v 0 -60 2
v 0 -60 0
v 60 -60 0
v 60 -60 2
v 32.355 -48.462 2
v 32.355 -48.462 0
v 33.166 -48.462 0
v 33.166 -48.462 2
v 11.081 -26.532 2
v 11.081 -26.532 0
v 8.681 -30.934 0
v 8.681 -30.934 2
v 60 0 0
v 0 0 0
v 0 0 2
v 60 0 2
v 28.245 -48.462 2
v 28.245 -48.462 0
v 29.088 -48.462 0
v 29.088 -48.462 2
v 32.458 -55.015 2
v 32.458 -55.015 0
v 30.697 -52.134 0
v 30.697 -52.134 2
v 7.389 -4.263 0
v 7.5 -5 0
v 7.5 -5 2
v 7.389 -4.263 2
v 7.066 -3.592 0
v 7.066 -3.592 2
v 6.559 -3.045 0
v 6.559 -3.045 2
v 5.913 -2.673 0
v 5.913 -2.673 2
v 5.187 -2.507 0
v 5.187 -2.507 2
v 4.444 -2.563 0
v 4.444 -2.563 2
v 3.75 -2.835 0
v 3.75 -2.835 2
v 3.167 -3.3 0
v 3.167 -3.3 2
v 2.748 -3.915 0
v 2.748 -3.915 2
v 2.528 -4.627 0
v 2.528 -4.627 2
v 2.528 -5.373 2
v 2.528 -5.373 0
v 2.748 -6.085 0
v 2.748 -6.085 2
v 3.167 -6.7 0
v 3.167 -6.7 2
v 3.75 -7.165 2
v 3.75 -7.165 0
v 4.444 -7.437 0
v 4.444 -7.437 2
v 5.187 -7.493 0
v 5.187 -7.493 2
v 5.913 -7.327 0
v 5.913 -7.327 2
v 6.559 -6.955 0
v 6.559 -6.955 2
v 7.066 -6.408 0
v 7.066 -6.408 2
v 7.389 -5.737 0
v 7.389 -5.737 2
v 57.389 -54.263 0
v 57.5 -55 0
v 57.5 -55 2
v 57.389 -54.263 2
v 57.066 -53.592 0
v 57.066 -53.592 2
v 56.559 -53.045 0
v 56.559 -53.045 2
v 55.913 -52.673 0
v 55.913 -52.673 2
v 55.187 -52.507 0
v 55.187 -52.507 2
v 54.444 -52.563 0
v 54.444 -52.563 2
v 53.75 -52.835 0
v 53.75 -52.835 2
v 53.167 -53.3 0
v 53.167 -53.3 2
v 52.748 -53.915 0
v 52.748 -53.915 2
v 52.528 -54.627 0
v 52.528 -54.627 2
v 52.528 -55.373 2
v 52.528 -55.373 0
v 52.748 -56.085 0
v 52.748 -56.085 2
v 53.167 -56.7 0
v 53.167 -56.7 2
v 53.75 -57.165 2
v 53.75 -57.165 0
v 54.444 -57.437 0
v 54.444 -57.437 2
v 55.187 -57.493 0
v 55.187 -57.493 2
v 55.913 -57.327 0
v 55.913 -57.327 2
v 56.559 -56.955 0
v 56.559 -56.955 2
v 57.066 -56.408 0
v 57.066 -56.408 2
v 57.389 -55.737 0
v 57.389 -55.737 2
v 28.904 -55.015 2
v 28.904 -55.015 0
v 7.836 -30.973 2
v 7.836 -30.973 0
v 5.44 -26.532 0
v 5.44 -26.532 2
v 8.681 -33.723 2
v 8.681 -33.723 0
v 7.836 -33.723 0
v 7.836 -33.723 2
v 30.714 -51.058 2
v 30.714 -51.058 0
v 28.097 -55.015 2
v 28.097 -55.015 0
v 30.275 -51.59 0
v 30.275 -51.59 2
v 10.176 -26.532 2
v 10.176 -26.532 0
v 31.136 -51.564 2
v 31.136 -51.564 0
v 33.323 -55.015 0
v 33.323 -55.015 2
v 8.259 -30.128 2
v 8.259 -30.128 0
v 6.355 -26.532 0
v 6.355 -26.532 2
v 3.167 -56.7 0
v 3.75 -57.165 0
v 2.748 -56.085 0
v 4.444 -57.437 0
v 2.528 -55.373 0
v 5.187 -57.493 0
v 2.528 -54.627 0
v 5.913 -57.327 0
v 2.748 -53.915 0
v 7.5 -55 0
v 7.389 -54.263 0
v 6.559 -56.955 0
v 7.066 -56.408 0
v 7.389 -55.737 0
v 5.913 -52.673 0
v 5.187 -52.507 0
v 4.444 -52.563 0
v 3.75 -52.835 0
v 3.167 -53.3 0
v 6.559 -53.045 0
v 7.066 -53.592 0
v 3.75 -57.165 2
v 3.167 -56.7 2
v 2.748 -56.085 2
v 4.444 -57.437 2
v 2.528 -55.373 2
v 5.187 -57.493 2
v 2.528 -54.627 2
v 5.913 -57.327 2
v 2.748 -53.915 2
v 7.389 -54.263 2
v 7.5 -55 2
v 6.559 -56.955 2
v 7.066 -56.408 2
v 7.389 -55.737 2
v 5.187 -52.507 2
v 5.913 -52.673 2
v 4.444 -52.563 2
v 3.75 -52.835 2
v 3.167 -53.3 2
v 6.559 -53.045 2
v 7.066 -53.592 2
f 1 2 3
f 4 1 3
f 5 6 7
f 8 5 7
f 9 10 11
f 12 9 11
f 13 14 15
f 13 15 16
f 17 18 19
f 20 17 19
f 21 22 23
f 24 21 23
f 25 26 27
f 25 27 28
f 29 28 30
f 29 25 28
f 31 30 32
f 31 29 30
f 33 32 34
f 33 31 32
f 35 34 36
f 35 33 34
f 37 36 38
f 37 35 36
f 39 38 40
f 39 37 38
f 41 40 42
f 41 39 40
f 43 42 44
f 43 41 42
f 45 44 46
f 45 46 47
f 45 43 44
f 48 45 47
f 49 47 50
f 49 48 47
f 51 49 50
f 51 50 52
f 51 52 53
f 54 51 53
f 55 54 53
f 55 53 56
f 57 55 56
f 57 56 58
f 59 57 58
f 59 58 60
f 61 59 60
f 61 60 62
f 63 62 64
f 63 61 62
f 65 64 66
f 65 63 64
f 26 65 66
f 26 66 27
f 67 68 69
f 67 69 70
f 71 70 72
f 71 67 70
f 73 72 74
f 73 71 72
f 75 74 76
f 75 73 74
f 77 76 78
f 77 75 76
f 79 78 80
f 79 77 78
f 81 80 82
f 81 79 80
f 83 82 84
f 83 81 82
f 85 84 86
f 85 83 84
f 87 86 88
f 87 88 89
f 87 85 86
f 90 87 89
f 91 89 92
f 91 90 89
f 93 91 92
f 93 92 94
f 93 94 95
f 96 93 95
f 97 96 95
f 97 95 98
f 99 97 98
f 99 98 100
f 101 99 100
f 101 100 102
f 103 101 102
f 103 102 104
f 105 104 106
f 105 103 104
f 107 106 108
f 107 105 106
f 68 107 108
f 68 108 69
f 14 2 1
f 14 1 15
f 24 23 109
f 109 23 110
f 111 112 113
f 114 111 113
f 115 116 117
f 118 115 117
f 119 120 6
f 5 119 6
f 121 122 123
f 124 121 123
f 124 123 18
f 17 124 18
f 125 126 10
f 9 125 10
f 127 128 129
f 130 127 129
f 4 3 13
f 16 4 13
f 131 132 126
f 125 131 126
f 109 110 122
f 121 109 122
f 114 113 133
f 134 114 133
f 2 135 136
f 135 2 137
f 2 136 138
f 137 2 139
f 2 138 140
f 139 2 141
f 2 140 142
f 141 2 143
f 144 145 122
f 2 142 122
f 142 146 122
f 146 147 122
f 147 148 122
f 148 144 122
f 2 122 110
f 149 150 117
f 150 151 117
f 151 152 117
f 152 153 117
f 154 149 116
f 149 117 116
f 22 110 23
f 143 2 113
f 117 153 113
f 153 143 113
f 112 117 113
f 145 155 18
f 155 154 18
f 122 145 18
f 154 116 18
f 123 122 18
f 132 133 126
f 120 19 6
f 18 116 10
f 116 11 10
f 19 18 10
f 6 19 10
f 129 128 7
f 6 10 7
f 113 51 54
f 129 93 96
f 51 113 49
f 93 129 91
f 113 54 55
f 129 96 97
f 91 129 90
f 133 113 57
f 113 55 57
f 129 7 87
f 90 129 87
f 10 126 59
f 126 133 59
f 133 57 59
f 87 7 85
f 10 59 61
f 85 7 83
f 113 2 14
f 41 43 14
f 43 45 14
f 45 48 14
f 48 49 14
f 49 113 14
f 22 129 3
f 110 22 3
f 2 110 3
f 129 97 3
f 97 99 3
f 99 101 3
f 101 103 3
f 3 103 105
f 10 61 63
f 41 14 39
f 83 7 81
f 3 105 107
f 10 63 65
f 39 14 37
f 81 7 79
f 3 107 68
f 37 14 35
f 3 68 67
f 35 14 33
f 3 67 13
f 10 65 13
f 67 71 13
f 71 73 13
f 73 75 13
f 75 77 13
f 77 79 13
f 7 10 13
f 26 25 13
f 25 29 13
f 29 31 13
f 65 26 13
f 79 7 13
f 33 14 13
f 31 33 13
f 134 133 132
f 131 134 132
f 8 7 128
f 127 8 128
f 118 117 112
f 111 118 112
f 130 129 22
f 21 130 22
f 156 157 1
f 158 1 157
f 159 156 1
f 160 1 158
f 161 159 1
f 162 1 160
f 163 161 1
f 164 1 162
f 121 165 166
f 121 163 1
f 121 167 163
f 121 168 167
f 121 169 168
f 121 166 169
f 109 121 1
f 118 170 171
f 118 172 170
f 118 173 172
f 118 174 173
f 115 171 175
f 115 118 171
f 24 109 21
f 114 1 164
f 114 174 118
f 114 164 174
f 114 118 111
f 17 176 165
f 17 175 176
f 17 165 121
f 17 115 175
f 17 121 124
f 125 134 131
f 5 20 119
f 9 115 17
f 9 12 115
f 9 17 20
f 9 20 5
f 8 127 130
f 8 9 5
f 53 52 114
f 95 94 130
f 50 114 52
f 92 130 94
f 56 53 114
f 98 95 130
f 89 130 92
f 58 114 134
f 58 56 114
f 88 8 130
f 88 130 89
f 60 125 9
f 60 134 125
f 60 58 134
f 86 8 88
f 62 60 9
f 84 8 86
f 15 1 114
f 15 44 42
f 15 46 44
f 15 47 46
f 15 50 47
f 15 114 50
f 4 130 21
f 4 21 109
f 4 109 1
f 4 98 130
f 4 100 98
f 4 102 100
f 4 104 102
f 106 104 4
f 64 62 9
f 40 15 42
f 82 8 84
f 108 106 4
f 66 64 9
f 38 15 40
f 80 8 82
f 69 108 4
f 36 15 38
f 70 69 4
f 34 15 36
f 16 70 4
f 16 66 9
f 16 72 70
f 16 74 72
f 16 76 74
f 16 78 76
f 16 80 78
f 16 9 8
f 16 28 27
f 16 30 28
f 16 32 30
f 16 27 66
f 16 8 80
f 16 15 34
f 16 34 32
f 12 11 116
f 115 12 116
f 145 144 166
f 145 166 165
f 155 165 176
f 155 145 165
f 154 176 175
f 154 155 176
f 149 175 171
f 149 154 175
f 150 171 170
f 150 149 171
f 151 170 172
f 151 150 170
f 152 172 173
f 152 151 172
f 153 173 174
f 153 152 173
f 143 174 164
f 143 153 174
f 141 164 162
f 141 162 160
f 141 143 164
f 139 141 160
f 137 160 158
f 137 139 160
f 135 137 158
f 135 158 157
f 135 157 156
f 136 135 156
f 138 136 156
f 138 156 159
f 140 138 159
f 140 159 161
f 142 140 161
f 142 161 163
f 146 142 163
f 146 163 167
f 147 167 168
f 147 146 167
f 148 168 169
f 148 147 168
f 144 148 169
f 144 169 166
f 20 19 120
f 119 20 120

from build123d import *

# Parameters (mm, degrees)
F0_W     = 60
F0_H     = 60
F0_R     = 2.5
F1_DEPTH = 2


with BuildPart() as f1:
    # F0 (on Top) → F1 (new body)
    with BuildSketch(Plane.XY):
        with Locations((30, -30)):
            Rectangle(F0_W, F0_H)
        with Locations((5, -55)):
            Circle(F0_R, mode=Mode.SUBTRACT)
        Polygon((6.3547094441, -26.5316670423), (8.2590716884, -30.1279213632), (10.1760247574, -26.5316670423), (11.0809902868, -26.5316670423), (8.6808643177, -30.9337341476), (8.6808643177, -33.722601831), (7.835705206, -33.722601831), (7.835705206, -30.9730804749), (5.4403007962, -26.5316670423), align=None, mode=Mode.SUBTRACT)
        Polygon((31.1360398773, -51.5644881962), (33.3232842313, -55.0153143704), (32.4584262999, -55.0153143704), (30.6971567479, -52.1338888575), (28.9043335069, -55.0153143704), (28.0968459192, -55.0153143704), (30.2754847216, -51.5903048508), (28.2445745543, -48.46218686), (29.0879186068, -48.46218686), (30.714367851, -51.0581949129), (32.3551596812, -48.46218686), (33.1655157861, -48.46218686), align=None, mode=Mode.SUBTRACT)
        with Locations((55, -55)):
            Circle(F0_R, mode=Mode.SUBTRACT)
        with Locations((5, -5)):
            Circle(F0_R, mode=Mode.SUBTRACT)
    extrude(amount=F1_DEPTH)


solid = f1.part
